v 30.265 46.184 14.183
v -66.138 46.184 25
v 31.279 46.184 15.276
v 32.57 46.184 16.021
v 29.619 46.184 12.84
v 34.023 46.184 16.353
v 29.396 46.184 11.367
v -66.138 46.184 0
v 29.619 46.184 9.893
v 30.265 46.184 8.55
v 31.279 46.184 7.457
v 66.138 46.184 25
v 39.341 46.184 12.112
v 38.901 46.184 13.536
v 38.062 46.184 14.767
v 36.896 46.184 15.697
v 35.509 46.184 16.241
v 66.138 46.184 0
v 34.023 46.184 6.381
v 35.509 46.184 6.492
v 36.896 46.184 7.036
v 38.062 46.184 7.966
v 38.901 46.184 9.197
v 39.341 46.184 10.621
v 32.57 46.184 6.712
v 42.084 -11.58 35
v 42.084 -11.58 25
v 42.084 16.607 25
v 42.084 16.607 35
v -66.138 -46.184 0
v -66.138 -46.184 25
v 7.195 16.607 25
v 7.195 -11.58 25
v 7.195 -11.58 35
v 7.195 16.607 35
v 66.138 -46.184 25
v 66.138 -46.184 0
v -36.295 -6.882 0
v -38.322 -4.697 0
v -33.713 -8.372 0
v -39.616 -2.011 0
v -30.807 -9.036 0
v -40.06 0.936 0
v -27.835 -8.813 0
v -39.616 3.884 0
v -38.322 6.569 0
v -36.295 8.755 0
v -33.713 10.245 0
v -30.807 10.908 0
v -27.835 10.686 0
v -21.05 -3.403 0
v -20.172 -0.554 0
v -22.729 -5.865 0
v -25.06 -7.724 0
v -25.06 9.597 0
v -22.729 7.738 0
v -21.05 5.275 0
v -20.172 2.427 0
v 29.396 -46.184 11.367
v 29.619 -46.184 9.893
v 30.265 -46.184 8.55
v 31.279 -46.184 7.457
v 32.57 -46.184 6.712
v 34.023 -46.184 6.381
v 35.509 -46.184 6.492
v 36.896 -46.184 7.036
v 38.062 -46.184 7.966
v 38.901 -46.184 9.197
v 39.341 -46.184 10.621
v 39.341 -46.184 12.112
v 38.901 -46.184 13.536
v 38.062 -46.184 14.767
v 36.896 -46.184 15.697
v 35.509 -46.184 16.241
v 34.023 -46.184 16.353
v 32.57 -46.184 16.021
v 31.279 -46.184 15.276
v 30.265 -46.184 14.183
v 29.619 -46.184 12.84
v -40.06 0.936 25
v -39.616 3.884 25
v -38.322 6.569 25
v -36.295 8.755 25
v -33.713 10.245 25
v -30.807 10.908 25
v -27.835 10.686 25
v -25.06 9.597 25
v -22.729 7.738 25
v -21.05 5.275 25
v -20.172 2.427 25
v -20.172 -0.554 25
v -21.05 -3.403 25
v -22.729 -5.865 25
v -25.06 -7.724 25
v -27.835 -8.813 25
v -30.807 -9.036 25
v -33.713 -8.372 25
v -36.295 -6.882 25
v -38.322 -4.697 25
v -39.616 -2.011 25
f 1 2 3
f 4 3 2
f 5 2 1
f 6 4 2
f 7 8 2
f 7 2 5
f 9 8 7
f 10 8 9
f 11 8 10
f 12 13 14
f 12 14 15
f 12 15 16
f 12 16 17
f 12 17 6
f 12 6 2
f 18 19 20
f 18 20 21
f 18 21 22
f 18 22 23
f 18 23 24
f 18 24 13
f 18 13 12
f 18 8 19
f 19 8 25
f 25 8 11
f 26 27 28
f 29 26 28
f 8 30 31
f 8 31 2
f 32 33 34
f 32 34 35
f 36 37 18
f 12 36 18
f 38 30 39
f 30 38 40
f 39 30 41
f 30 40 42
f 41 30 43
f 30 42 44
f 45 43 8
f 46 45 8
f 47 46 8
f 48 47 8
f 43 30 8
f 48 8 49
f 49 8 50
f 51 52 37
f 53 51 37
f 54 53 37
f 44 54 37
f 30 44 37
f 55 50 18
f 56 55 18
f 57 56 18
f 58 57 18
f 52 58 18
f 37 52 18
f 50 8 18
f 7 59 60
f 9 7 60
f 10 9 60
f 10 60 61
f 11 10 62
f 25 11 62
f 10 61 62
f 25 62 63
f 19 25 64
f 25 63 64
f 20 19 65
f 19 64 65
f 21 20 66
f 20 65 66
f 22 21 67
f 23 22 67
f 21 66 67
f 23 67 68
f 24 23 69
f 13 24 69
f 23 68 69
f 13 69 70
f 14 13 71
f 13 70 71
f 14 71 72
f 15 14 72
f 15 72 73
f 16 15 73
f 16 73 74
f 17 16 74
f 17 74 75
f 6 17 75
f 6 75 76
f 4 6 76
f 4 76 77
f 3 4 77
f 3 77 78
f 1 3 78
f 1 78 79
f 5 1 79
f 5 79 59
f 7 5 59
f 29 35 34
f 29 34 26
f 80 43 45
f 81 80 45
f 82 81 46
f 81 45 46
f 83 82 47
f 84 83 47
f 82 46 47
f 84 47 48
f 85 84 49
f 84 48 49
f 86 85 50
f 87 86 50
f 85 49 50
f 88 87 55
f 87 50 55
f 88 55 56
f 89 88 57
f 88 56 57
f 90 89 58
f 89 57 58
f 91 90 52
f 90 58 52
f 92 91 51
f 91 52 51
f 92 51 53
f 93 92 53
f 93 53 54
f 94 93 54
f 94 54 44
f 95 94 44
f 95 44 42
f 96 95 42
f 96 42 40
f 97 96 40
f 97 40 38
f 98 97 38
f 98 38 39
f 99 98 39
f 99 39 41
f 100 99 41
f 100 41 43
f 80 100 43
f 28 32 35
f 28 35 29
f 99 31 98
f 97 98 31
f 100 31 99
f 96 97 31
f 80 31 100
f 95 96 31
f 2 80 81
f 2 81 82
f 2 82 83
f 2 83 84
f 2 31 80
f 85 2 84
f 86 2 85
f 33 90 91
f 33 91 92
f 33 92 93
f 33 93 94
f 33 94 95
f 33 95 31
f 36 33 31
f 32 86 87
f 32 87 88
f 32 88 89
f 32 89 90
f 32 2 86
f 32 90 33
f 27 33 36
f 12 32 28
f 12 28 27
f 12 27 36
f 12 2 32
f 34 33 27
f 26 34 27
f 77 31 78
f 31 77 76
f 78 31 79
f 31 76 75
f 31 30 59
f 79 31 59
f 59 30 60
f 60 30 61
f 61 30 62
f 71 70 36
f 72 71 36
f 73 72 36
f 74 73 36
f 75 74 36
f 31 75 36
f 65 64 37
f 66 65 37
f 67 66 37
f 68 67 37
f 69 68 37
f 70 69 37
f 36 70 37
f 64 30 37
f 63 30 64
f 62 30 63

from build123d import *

# Parameters (mm, degrees)
SKETCH1_W              = 132.276038998
SKETCH1_H              = 92.368395504
BOSS_EXTRUDE1_DEPTH    = 25
F_20_0MM_DOWEL_HOLE1_D = 20
F_10_0MM_DOWEL_HOLE1_D = 10
SKETCH8_W              = 34.889280452
SKETCH8_H              = 28.187384772
BOSS_EXTRUDE2_DEPTH    = 10


with BuildPart() as part:
    # Sketch1 → Boss-Extrude1 (new body)
    with BuildSketch(Plane.XY):
        Rectangle(SKETCH1_W, SKETCH1_H)
    extrude(amount=BOSS_EXTRUDE1_DEPTH)

    # Ø20.0mm Dowel Hole1 (through all)
    with Locations(Plane.XY.offset(25)):
        with Locations((-30.059973271, 0.936294249)):
            Hole(F_20_0MM_DOWEL_HOLE1_D / 2)

    # Ø10.0mm Dowel Hole1 (through all)
    with Locations(Plane(origin=(0, 46.184197752, 0), x_dir=(1, 0, 0), z_dir=(0, 1, 0))):
        with Locations((34.396494005, -11.366591172)):
            Hole(F_10_0MM_DOWEL_HOLE1_D / 2)

    # Sketch8 → Boss-Extrude2 (add)
    with BuildSketch(Plane.XY.offset(25)):
        with Locations((24.639322353, 2.51321088)):
            Rectangle(SKETCH8_W, SKETCH8_H)
    extrude(amount=BOSS_EXTRUDE2_DEPTH)


solid = part.part
